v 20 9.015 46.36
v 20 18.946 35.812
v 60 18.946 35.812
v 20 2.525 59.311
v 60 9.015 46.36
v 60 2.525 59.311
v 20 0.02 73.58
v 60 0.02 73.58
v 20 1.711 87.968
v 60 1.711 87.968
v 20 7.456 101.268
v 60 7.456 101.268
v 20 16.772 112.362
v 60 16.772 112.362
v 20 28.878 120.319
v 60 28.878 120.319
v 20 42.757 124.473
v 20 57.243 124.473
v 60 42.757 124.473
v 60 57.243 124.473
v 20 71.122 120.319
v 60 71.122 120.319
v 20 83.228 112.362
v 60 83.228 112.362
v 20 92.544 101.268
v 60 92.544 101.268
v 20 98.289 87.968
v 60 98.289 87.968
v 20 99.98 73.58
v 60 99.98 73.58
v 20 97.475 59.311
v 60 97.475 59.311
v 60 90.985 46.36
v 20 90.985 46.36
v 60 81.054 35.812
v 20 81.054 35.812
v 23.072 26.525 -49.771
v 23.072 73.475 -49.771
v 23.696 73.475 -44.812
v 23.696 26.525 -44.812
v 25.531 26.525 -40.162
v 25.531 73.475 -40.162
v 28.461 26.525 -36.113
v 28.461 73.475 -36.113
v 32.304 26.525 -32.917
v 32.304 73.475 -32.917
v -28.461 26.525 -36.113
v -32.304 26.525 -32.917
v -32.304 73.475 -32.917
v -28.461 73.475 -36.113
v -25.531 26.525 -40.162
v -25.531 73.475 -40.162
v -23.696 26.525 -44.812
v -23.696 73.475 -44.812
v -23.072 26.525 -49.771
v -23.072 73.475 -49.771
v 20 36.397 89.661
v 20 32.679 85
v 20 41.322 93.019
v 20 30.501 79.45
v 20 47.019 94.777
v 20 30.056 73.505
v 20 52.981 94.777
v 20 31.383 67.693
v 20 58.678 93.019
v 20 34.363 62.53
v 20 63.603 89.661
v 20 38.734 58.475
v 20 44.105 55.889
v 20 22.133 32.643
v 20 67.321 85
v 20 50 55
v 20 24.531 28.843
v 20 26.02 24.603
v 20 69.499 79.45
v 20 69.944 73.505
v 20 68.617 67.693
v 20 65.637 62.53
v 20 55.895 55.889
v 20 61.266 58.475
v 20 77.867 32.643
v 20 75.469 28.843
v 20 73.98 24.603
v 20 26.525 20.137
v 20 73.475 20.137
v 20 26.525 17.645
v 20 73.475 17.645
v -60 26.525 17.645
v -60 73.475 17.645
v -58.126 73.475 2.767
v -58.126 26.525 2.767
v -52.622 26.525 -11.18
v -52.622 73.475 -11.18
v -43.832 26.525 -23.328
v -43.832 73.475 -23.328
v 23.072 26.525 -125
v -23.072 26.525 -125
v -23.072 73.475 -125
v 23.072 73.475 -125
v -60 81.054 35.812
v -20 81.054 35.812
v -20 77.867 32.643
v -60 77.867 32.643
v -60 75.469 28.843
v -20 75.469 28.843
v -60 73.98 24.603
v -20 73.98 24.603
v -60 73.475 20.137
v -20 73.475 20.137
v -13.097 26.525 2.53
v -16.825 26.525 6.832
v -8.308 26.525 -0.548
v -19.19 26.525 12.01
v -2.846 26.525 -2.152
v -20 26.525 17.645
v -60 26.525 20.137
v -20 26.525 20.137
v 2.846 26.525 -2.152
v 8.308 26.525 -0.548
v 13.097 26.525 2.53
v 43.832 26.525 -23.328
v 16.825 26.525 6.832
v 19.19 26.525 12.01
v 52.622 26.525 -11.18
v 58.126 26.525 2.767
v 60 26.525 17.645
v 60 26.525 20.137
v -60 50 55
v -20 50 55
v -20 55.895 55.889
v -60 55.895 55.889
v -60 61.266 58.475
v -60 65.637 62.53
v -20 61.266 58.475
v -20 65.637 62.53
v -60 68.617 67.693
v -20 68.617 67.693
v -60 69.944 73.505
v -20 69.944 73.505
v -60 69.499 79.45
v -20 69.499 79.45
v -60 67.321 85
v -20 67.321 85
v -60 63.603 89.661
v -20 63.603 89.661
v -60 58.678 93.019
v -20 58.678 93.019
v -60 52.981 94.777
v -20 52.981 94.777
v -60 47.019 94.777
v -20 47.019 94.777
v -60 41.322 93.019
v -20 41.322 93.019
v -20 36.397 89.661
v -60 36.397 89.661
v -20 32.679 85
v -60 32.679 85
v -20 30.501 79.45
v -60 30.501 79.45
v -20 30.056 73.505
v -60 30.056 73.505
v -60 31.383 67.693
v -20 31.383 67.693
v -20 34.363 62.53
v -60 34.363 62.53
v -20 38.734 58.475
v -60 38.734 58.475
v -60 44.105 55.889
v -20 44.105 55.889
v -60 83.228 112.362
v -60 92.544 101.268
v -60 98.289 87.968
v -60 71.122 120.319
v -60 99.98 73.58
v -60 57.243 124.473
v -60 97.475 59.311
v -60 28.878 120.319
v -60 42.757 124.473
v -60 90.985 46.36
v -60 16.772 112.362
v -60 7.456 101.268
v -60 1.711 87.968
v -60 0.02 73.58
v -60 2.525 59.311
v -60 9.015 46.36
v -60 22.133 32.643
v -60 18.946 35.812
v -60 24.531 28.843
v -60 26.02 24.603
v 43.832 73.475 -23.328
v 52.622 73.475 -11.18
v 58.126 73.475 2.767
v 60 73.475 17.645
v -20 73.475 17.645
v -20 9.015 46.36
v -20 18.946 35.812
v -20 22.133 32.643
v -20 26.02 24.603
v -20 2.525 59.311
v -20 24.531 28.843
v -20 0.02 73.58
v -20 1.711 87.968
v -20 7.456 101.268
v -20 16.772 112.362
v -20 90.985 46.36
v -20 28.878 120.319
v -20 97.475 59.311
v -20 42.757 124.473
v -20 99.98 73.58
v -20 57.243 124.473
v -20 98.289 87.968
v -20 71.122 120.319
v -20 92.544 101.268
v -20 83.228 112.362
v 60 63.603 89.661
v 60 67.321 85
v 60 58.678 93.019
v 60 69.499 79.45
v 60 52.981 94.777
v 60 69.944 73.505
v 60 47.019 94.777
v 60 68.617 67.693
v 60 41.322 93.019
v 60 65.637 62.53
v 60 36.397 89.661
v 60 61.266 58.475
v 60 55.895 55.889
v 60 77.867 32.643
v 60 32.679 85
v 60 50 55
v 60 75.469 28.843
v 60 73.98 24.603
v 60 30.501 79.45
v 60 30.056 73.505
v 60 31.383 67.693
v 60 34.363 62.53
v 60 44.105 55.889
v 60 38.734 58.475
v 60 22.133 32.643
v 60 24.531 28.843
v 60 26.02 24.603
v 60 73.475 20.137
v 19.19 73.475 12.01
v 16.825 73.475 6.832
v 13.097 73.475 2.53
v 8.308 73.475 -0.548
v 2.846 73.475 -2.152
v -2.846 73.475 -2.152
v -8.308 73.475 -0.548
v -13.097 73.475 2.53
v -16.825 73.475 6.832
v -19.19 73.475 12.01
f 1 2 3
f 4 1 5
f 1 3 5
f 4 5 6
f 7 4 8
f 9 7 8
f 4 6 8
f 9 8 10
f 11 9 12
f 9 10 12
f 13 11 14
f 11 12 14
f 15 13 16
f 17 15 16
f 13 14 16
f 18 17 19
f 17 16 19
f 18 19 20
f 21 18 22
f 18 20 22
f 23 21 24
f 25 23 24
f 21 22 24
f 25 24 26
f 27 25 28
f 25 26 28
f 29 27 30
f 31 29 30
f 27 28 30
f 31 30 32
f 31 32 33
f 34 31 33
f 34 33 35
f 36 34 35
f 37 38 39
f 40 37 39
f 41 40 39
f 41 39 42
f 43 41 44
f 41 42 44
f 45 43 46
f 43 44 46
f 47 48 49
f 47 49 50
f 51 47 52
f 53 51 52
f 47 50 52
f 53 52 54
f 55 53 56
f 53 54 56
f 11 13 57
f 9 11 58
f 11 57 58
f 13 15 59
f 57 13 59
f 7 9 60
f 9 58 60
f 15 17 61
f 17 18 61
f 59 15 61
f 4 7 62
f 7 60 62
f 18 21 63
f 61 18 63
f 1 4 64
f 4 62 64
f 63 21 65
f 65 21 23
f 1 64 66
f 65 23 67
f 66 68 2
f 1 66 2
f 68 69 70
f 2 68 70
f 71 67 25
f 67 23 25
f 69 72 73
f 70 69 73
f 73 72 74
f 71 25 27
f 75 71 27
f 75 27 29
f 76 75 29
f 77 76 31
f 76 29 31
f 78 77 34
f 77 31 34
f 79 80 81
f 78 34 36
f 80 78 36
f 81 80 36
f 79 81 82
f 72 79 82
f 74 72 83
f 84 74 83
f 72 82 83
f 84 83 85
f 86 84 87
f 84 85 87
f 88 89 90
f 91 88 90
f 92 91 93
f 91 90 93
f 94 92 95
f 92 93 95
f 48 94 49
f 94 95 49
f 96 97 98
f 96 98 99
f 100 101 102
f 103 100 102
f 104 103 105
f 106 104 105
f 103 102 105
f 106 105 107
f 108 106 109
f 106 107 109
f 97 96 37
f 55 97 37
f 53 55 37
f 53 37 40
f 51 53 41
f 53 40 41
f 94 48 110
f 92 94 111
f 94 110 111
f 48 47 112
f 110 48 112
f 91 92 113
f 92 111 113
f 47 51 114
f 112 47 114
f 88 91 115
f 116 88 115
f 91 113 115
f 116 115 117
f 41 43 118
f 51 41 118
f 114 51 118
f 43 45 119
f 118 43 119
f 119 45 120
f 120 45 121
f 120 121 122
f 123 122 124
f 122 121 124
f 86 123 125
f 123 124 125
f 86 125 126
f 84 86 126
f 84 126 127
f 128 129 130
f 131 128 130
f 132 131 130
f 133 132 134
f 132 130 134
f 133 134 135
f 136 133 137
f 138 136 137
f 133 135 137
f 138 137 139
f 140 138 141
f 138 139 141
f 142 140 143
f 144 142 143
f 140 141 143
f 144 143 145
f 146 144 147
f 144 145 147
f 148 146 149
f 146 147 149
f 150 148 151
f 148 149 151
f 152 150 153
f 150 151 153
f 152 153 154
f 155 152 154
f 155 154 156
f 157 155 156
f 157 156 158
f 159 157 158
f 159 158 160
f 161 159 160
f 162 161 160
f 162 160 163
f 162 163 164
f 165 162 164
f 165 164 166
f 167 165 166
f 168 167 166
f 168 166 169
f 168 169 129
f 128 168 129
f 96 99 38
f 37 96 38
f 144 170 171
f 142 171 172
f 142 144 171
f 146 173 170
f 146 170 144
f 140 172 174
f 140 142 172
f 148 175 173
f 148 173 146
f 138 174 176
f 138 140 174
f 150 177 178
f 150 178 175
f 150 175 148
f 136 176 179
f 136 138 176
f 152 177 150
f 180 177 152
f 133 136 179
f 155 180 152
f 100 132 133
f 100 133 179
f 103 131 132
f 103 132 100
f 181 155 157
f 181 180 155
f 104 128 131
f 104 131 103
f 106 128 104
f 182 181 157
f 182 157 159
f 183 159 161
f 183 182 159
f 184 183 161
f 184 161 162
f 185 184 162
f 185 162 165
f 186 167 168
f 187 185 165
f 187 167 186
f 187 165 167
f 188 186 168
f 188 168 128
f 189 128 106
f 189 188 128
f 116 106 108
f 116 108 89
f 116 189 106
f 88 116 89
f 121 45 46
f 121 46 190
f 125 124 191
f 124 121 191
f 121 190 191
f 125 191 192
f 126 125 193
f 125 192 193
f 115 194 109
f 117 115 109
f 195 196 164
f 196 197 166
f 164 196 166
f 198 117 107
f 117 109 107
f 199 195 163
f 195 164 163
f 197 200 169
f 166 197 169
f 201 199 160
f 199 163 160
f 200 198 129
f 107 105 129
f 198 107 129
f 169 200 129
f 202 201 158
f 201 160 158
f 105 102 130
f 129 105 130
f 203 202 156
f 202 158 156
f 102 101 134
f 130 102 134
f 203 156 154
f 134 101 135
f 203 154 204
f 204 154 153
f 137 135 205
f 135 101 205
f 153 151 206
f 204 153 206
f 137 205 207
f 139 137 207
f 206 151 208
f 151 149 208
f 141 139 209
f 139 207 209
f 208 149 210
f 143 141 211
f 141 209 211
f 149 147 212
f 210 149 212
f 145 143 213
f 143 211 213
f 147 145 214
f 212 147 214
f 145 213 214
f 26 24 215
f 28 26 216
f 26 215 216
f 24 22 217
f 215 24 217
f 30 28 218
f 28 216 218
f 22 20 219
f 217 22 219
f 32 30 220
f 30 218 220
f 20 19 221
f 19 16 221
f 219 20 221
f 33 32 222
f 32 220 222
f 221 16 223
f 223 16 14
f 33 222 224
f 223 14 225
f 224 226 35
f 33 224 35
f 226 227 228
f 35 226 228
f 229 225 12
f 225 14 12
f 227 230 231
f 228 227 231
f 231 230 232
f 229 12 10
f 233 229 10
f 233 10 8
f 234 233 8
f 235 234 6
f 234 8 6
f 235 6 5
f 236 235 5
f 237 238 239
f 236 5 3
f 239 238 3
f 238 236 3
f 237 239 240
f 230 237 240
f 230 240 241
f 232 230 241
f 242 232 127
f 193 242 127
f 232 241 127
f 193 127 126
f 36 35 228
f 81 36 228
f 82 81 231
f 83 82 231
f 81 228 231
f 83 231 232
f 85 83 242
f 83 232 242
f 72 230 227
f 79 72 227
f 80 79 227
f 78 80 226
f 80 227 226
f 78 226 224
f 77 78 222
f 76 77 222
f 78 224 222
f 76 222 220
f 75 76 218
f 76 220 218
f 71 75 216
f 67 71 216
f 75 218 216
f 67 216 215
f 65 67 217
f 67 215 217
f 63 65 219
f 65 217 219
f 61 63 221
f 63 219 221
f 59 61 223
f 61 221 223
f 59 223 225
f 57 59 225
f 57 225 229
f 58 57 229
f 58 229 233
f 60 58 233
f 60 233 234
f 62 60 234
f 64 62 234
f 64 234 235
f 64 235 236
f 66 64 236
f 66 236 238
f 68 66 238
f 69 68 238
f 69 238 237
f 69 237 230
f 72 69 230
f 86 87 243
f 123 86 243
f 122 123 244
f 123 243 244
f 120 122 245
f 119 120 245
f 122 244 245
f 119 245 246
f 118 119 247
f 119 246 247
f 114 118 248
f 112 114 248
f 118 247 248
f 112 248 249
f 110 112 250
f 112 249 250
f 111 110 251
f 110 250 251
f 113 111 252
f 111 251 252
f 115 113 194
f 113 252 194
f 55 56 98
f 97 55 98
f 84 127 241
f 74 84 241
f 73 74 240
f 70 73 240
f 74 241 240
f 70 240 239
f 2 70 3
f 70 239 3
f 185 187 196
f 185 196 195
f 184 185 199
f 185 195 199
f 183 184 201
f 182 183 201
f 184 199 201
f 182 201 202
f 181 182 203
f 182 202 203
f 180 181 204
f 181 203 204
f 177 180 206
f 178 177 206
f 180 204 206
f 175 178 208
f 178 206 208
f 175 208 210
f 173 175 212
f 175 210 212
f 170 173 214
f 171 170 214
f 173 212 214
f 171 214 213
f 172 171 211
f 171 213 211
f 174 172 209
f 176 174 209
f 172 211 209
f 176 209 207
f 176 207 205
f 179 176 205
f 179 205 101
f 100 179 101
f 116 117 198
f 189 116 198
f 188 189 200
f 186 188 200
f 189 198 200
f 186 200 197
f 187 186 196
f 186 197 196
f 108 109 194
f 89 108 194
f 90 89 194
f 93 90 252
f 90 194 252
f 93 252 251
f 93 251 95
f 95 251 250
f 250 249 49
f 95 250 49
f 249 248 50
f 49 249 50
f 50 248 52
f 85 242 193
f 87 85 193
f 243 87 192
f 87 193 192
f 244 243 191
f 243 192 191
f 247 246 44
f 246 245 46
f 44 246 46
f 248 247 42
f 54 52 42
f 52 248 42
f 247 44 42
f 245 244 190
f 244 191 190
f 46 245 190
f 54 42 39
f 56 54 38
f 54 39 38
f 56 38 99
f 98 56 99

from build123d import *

# Parameters (mm, degrees)
SKETCH2_W           = 120
SKETCH2_H           = 250
BOSS_EXTRUDE1_DEPTH = 100
SKETCH4_R           = 20
CUT_EXTRUDE1_DEPTH  = 100
SKETCH5_R           = 20
CUT_EXTRUDE5_DEPTH  = 201.062490237


with BuildPart() as part:
    # Sketch2 → Boss-Extrude1 (new body)
    with BuildSketch(Plane(origin=(0, 0, 0), x_dir=(1, 0, 0), z_dir=(0, 1, 0))):
        Rectangle(SKETCH2_W, SKETCH2_H)
    extrude(amount=BOSS_EXTRUDE1_DEPTH)

    # Sketch4 → Cut-Extrude1 (cut)
    with BuildSketch(Plane(origin=(0, 100, 0), x_dir=(1, 0, 0), z_dir=(0, 1, 0))):
        with BuildLine():
            Line((-60, 125), (-60, -17.644609552))
            ThreePointArc((-60, -17.644609552), (-52.622366518, 11.180492718), (-32.303782241, 32.916893747))
            ThreePointArc((-32.303782241, 32.916893747), (-25.530920786, 40.16236081), (-23.071709655, 49.770728302))
            Line((-23.071709655, 49.770728302), (-23.071709655, 125))
            Line((-23.071709655, 125), (-60, 125))
        make_face()
        with BuildLine():
            ThreePointArc((32.303782241, 32.916893747), (52.62236667, 11.18049244), (60, -17.644610185))
            Line((60, -17.644610185), (60, 125))
            Line((60, 125), (23.071709655, 125))
            Line((23.071709655, 125), (23.071709655, 49.770728302))
            ThreePointArc((23.071709655, 49.770728302), (25.530920786, 40.16236081), (32.303782241, 32.916893747))
        make_face()
        with Locations((0, -17.644609919)):
            Circle(SKETCH4_R)
        with BuildLine():
            Line((-20, -17.644609919), (-20, -74.213152414))
            ThreePointArc((-20, -74.213152414), (0, -77.644609919), (20, -74.213152414))
            Line((20, -74.213152414), (20, -17.644609919))
            ThreePointArc((20, -17.644609919), (0, -37.644609919), (-20, -17.644609919))
        make_face()
        with BuildLine():
            Line((-20, -74.213152414), (-20, -125))
            Line((-20, -125), (20, -125))
            Line((20, -125), (20, -74.213152414))
            ThreePointArc((20, -74.213152414), (0, -77.644609919), (-20, -74.213152414))
        make_face()
    extrude(amount=-CUT_EXTRUDE1_DEPTH, mode=Mode.SUBTRACT)

    # Sketch5 → Cut-Extrude5 (cut, through all)
    # profile 1 of 2: a face of its own
    with BuildSketch(Plane(origin=(60, 0, 0), x_dir=(0, 0, -1), z_dir=(1, 0, 0))):
        Polygon((125, 100), (49.770728302, 100), (32.916893747, 100), (-17.644609919, 100), (-125, 100), (-125, 0), (-17.644609919, 0), (32.916893747, 0), (49.770728302, 0), (125, 0), align=None)
        with BuildLine():
            Line((125, 73.474979738), (125, 26.525020262))
            Line((125, 26.525020262), (-20.137206262, 26.525020262))
            ThreePointArc((-20.137206262, 26.525020262), (-28.84270867, 24.530970051), (-35.812290187, 18.946443044))
            ThreePointArc((-35.812290187, 18.946443044), (-125, 50), (-35.812290187, 81.053556956))
            ThreePointArc((-35.812290187, 81.053556956), (-28.84270867, 75.469029949), (-20.137206262, 73.474979738))
            Line((-20.137206262, 73.474979738), (125, 73.474979738))
        make_face(mode=Mode.SUBTRACT)
    # profile 2 of 2: a face of its own
    with BuildSketch(Plane(origin=(60, 0, 0), x_dir=(0, 0, -1), z_dir=(1, 0, 0))):
        with Locations((-75, 50)):
            Circle(SKETCH5_R)
    extrude(amount=-CUT_EXTRUDE5_DEPTH, mode=Mode.SUBTRACT)


with BuildPart() as cut_extrude5_kept_piece:
    # of the separate pieces the step leaves, the one the design keeps (cut_extrude5_pieces_kept)
    add(part.part.solids().sort_by_distance((23.071709655, 73.474979738, -125))[0])


solid = cut_extrude5_kept_piece.part
